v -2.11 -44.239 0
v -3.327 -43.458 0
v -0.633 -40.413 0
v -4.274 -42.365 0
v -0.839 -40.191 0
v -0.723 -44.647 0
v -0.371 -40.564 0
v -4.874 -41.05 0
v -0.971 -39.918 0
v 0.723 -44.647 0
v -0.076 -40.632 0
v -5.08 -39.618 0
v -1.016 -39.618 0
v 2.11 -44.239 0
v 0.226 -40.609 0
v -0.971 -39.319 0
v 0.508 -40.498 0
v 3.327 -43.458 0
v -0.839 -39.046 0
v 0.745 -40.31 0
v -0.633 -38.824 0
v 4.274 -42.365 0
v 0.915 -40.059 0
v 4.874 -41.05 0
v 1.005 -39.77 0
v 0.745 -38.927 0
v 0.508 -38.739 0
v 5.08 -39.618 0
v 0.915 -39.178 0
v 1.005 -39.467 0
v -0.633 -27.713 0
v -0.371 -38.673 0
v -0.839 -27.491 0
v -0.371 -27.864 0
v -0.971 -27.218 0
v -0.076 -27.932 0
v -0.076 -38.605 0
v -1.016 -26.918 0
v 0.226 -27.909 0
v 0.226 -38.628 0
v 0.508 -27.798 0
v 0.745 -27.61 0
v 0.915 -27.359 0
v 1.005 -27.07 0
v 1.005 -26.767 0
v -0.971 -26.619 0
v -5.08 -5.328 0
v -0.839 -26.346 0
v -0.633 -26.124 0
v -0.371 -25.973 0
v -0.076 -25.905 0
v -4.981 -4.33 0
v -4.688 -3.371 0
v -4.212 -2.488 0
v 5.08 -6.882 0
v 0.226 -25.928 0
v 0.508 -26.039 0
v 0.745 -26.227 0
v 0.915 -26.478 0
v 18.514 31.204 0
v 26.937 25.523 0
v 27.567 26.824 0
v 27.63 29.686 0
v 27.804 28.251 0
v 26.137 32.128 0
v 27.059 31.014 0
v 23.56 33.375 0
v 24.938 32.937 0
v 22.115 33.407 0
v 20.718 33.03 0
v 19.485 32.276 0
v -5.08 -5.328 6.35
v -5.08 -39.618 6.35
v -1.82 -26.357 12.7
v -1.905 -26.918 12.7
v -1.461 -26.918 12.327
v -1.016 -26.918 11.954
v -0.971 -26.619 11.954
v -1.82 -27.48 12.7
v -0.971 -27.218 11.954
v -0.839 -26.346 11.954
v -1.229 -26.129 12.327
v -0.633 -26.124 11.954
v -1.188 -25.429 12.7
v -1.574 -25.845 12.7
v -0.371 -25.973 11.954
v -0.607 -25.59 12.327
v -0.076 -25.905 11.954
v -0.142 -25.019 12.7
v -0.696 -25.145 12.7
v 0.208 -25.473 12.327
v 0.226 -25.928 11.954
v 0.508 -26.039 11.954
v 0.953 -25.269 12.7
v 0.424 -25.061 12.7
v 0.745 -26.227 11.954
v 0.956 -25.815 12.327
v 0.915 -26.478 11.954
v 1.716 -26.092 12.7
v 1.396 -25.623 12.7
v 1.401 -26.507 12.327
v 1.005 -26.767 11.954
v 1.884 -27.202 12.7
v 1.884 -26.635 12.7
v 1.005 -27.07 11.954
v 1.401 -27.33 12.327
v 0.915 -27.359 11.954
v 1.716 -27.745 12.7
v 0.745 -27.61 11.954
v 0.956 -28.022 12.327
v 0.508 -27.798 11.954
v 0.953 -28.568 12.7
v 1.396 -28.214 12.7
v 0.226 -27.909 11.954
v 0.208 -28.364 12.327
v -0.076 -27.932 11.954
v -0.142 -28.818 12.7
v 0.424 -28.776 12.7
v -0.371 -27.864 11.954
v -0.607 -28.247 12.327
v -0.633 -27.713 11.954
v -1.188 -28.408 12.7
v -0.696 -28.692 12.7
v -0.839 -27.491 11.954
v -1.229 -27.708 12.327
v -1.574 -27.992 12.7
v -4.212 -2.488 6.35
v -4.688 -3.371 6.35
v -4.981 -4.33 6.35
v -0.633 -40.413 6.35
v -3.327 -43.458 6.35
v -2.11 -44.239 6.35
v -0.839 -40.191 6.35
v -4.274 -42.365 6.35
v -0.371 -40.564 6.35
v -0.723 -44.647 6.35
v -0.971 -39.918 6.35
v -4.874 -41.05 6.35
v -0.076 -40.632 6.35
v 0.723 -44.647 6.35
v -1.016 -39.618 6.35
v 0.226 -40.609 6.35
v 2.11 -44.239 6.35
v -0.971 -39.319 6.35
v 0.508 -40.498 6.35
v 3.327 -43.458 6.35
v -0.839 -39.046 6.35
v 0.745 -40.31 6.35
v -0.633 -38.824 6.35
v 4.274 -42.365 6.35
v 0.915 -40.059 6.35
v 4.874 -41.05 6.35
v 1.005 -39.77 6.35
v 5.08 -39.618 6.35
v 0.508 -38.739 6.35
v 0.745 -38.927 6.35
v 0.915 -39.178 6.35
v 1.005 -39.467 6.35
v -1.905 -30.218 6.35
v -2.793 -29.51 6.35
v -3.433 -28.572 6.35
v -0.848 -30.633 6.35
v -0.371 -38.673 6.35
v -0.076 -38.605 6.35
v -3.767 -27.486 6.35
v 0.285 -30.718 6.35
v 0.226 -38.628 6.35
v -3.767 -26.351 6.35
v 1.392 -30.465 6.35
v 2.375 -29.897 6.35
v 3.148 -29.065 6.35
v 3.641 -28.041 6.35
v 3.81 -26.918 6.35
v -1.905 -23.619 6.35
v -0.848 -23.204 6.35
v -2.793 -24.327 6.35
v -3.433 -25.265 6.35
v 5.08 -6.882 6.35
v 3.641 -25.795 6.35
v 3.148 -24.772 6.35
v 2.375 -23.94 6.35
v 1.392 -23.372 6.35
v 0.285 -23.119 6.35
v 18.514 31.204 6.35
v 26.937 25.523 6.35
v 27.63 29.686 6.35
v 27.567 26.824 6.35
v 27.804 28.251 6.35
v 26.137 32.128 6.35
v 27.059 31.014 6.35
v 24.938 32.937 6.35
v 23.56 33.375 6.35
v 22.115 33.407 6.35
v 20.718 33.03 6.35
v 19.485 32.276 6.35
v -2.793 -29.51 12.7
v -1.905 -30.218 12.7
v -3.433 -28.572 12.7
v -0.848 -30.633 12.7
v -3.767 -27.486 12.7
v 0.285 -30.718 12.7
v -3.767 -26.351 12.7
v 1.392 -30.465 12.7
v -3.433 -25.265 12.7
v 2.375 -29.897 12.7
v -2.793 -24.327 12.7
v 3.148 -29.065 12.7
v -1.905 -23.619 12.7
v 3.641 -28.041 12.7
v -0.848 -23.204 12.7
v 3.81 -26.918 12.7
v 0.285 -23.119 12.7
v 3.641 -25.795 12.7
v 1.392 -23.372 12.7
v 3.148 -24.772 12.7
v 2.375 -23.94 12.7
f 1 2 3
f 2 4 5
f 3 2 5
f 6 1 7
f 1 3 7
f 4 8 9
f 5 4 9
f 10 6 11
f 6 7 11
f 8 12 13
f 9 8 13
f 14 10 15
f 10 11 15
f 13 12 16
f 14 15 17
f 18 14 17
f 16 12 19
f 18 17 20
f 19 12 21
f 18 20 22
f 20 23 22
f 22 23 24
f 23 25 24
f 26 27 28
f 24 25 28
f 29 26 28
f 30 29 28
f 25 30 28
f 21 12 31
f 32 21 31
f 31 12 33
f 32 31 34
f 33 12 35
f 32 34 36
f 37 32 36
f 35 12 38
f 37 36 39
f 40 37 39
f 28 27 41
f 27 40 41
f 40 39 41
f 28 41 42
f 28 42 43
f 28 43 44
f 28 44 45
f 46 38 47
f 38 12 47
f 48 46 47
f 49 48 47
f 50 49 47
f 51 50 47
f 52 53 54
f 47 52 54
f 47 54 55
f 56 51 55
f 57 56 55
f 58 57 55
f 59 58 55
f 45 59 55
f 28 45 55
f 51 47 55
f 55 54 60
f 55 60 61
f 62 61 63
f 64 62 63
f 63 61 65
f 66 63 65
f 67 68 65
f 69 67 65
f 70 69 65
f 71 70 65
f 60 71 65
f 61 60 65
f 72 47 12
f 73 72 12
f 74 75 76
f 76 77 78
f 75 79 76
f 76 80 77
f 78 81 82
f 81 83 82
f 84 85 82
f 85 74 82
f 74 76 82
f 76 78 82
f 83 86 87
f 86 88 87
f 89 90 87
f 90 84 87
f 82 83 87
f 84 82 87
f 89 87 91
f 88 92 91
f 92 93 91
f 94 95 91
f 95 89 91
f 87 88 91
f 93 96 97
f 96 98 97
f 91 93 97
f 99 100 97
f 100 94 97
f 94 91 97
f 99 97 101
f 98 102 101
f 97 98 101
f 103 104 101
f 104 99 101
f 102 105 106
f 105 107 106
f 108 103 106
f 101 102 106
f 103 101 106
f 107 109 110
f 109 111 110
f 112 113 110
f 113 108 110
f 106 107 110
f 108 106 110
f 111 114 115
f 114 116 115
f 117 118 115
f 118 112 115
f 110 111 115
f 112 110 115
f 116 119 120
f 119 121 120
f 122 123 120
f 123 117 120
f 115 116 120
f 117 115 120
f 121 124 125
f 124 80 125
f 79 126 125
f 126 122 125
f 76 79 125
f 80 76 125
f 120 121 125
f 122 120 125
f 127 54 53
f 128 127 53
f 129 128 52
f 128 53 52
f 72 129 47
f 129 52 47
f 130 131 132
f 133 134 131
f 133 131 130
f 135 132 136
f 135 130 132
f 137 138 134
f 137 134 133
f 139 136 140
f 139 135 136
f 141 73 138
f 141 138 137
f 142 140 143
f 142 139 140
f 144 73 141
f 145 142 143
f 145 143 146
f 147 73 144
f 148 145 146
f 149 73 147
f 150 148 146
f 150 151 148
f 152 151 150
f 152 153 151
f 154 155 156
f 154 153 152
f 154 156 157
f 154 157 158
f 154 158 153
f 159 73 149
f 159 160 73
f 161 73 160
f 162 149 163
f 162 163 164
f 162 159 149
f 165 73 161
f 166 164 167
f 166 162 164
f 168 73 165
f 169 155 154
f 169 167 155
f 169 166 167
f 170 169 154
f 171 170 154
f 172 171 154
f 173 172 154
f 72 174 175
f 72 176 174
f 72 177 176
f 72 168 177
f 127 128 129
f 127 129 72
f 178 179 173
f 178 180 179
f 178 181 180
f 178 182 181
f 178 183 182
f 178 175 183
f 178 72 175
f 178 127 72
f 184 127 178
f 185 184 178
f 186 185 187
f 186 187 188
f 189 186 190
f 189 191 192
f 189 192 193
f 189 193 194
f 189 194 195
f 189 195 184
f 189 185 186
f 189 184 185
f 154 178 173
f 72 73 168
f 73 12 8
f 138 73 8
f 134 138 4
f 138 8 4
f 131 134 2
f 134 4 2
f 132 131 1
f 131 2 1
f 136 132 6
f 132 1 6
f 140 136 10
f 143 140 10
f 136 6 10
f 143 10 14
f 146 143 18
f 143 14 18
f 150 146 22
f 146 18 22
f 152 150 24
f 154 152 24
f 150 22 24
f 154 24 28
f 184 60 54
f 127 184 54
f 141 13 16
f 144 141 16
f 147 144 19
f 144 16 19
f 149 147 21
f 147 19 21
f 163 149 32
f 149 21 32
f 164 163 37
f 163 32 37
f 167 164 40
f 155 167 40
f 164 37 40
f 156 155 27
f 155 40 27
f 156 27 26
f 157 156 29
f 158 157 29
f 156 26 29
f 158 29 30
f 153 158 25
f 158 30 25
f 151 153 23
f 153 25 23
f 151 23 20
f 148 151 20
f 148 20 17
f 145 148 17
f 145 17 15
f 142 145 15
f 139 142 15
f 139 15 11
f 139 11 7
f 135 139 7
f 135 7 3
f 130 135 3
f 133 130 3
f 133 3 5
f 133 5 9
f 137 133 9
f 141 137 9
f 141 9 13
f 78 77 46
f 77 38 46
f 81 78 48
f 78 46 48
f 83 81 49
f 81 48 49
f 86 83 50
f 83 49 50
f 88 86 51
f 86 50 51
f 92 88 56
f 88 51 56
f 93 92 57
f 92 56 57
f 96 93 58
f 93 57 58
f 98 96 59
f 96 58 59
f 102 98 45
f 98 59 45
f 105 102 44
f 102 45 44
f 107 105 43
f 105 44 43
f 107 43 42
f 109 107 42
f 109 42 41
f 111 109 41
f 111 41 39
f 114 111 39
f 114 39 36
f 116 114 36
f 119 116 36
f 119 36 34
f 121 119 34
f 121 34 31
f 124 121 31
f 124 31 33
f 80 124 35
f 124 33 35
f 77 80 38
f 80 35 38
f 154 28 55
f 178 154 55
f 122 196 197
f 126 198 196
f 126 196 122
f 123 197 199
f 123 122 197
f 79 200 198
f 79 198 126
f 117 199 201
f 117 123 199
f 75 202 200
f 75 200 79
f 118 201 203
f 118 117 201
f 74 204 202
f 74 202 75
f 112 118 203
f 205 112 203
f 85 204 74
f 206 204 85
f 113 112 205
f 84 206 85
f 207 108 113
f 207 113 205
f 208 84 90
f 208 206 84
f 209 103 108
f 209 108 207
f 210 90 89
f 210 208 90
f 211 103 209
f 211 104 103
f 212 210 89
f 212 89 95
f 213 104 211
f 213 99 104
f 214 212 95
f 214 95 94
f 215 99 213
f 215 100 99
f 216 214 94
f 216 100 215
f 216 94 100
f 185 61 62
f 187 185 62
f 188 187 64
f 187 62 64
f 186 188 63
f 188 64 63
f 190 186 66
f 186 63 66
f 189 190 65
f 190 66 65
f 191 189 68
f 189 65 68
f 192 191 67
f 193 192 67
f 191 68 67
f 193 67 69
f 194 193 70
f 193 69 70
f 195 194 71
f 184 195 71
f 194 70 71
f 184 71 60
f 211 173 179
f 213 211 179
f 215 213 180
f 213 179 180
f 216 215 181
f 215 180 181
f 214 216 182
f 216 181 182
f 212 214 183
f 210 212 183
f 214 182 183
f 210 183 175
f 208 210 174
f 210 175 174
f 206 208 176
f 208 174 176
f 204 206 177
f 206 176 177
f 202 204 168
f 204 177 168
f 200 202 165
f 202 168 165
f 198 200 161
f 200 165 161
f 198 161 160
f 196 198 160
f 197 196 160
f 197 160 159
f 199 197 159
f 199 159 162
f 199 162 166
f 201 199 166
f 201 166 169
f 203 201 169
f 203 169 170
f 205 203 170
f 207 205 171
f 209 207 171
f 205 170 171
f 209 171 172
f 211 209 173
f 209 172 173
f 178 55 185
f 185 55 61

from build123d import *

# Parameters (mm, degrees)
F1_DEPTH       = 6.35
F2_R           = 3.81
F3_DEPTH       = 6.35
F5_D           = 2.032
F5_CSINK_D     = 3.81
F5_CSINK_ANGLE = 100
F7_D           = 2.032


with BuildPart() as f1:
    # F0 (on Top) → F1 (new body)
    with BuildSketch(Plane.XY):
        with BuildLine():
            ThreePointArc((-5.08, -26.9184786366), (-3.5921024484, -30.5105810851), (0, -31.9984786366))
            Line((0, -31.9984786366), (0, -26.9184786366))
            Line((0, -26.9184786366), (0, -21.8384786366))
            ThreePointArc((0, -21.8384786366), (-3.5921024484, -23.3263761882), (-5.08, -26.9184786366))
        make_face()
        with BuildLine():
            Line((0, -26.9184786366), (0, -31.9984786366))
            ThreePointArc((0, -31.9984786366), (3.5921024484, -30.5105810851), (5.08, -26.9184786366))
            ThreePointArc((5.08, -26.9184786366), (3.5921024484, -23.3263761882), (0, -21.8384786366))
            Line((0, -21.8384786366), (0, -26.9184786366))
        make_face()
        with BuildLine():
            ThreePointArc((5.08, -26.9184786366), (3.5921024484, -30.5105810851), (0, -31.9984786366))
            ThreePointArc((0, -31.9984786366), (-3.5921024484, -30.5105810851), (-5.08, -26.9184786366))
            Line((-5.08, -26.9184786366), (-5.08, -39.6184786366))
            ThreePointArc((-5.08, -39.6184786366), (0, -44.6984786366), (5.08, -39.6184786366))
            Line((5.08, -39.6184786366), (5.08, -26.9184786366))
        make_face()
        with BuildLine():
            ThreePointArc((0, -21.8384786366), (3.5921024484, -23.3263761882), (5.08, -26.9184786366))
            Line((5.08, -26.9184786366), (5.08, -6.8815904984))
            Line((5.08, -6.8815904984), (4.2115108686, -8.1691785863))
            ThreePointArc((4.2115108686, -8.1691785863), (2.384915539, -9.8138524083), (0, -10.4084786366))
            Line((0, -10.4084786366), (0, -21.8384786366))
        make_face()
        with BuildLine():
            Line((-5.08, -5.3284786366), (-5.08, -26.9184786366))
            ThreePointArc((-5.08, -26.9184786366), (-3.5921024484, -23.3263761882), (0, -21.8384786366))
            Line((0, -21.8384786366), (0, -10.4084786366))
            ThreePointArc((0, -10.4084786366), (-3.5921024484, -8.9205810851), (-5.08, -5.3284786366))
        make_face()
        with BuildLine():
            Line((5.08, -5.3284786366), (5.08, -6.8815904984))
            Line((5.08, -6.8815904984), (26.9371104656, 25.5229083624))
            ThreePointArc((26.9371104656, 25.5229083624), (25.5662995467, 32.5751191806), (18.5140887285, 31.2043082616))
            Line((18.5140887285, 31.2043082616), (-4.2115108686, -2.487778687))
            ThreePointArc((-4.2115108686, -2.487778687), (-0.9693096965, -0.3418125447), (2.8406999496, -1.116967768))
            ThreePointArc((2.8406999496, -1.116967768), (4.4853737717, -2.9435630977), (5.08, -5.3284786366))
        make_face()
        with BuildLine():
            Line((4.2115108686, -8.1691785863), (5.08, -6.8815904984))
            Line((5.08, -6.8815904984), (5.08, -5.3284786366))
            ThreePointArc((5.08, -5.3284786366), (4.4853737717, -2.9435630977), (2.8406999496, -1.116967768))
            Line((2.8406999496, -1.116967768), (0, -5.3284786366))
            Line((0, -5.3284786366), (0, -10.4084786366))
            ThreePointArc((0, -10.4084786366), (2.384915539, -9.8138524083), (4.2115108686, -8.1691785863))
        make_face()
        with BuildLine():
            ThreePointArc((-4.2115108686, -2.487778687), (-4.8580281603, -3.8432303766), (-5.08, -5.3284786366))
            ThreePointArc((-5.08, -5.3284786366), (-3.5921024484, -8.9205810851), (0, -10.4084786366))
            Line((0, -10.4084786366), (0, -5.3284786366))
            Line((0, -5.3284786366), (2.8406999496, -1.116967768))
            ThreePointArc((2.8406999496, -1.116967768), (-0.9693096965, -0.3418125447), (-4.2115108686, -2.487778687))
        make_face()
    extrude(amount=F1_DEPTH)

    # F2 (on face) → F3 (join)
    with BuildSketch(Plane.XY.offset(6.35)):
        with Locations((0, -26.9184786366)):
            Circle(F2_R)
    extrude(amount=F3_DEPTH)

    # F5 (through all)
    with Locations(Plane.XY.offset(12.7)):
        with Locations((0, -26.9184786366)):
            CounterSinkHole(F5_D / 2, F5_CSINK_D / 2, counter_sink_angle=F5_CSINK_ANGLE)

    # F7 (through all)
    with Locations(Plane.XY.offset(6.35)):
        with Locations((0, -39.6184786366)):
            Hole(F7_D / 2)


solid = f1.part
